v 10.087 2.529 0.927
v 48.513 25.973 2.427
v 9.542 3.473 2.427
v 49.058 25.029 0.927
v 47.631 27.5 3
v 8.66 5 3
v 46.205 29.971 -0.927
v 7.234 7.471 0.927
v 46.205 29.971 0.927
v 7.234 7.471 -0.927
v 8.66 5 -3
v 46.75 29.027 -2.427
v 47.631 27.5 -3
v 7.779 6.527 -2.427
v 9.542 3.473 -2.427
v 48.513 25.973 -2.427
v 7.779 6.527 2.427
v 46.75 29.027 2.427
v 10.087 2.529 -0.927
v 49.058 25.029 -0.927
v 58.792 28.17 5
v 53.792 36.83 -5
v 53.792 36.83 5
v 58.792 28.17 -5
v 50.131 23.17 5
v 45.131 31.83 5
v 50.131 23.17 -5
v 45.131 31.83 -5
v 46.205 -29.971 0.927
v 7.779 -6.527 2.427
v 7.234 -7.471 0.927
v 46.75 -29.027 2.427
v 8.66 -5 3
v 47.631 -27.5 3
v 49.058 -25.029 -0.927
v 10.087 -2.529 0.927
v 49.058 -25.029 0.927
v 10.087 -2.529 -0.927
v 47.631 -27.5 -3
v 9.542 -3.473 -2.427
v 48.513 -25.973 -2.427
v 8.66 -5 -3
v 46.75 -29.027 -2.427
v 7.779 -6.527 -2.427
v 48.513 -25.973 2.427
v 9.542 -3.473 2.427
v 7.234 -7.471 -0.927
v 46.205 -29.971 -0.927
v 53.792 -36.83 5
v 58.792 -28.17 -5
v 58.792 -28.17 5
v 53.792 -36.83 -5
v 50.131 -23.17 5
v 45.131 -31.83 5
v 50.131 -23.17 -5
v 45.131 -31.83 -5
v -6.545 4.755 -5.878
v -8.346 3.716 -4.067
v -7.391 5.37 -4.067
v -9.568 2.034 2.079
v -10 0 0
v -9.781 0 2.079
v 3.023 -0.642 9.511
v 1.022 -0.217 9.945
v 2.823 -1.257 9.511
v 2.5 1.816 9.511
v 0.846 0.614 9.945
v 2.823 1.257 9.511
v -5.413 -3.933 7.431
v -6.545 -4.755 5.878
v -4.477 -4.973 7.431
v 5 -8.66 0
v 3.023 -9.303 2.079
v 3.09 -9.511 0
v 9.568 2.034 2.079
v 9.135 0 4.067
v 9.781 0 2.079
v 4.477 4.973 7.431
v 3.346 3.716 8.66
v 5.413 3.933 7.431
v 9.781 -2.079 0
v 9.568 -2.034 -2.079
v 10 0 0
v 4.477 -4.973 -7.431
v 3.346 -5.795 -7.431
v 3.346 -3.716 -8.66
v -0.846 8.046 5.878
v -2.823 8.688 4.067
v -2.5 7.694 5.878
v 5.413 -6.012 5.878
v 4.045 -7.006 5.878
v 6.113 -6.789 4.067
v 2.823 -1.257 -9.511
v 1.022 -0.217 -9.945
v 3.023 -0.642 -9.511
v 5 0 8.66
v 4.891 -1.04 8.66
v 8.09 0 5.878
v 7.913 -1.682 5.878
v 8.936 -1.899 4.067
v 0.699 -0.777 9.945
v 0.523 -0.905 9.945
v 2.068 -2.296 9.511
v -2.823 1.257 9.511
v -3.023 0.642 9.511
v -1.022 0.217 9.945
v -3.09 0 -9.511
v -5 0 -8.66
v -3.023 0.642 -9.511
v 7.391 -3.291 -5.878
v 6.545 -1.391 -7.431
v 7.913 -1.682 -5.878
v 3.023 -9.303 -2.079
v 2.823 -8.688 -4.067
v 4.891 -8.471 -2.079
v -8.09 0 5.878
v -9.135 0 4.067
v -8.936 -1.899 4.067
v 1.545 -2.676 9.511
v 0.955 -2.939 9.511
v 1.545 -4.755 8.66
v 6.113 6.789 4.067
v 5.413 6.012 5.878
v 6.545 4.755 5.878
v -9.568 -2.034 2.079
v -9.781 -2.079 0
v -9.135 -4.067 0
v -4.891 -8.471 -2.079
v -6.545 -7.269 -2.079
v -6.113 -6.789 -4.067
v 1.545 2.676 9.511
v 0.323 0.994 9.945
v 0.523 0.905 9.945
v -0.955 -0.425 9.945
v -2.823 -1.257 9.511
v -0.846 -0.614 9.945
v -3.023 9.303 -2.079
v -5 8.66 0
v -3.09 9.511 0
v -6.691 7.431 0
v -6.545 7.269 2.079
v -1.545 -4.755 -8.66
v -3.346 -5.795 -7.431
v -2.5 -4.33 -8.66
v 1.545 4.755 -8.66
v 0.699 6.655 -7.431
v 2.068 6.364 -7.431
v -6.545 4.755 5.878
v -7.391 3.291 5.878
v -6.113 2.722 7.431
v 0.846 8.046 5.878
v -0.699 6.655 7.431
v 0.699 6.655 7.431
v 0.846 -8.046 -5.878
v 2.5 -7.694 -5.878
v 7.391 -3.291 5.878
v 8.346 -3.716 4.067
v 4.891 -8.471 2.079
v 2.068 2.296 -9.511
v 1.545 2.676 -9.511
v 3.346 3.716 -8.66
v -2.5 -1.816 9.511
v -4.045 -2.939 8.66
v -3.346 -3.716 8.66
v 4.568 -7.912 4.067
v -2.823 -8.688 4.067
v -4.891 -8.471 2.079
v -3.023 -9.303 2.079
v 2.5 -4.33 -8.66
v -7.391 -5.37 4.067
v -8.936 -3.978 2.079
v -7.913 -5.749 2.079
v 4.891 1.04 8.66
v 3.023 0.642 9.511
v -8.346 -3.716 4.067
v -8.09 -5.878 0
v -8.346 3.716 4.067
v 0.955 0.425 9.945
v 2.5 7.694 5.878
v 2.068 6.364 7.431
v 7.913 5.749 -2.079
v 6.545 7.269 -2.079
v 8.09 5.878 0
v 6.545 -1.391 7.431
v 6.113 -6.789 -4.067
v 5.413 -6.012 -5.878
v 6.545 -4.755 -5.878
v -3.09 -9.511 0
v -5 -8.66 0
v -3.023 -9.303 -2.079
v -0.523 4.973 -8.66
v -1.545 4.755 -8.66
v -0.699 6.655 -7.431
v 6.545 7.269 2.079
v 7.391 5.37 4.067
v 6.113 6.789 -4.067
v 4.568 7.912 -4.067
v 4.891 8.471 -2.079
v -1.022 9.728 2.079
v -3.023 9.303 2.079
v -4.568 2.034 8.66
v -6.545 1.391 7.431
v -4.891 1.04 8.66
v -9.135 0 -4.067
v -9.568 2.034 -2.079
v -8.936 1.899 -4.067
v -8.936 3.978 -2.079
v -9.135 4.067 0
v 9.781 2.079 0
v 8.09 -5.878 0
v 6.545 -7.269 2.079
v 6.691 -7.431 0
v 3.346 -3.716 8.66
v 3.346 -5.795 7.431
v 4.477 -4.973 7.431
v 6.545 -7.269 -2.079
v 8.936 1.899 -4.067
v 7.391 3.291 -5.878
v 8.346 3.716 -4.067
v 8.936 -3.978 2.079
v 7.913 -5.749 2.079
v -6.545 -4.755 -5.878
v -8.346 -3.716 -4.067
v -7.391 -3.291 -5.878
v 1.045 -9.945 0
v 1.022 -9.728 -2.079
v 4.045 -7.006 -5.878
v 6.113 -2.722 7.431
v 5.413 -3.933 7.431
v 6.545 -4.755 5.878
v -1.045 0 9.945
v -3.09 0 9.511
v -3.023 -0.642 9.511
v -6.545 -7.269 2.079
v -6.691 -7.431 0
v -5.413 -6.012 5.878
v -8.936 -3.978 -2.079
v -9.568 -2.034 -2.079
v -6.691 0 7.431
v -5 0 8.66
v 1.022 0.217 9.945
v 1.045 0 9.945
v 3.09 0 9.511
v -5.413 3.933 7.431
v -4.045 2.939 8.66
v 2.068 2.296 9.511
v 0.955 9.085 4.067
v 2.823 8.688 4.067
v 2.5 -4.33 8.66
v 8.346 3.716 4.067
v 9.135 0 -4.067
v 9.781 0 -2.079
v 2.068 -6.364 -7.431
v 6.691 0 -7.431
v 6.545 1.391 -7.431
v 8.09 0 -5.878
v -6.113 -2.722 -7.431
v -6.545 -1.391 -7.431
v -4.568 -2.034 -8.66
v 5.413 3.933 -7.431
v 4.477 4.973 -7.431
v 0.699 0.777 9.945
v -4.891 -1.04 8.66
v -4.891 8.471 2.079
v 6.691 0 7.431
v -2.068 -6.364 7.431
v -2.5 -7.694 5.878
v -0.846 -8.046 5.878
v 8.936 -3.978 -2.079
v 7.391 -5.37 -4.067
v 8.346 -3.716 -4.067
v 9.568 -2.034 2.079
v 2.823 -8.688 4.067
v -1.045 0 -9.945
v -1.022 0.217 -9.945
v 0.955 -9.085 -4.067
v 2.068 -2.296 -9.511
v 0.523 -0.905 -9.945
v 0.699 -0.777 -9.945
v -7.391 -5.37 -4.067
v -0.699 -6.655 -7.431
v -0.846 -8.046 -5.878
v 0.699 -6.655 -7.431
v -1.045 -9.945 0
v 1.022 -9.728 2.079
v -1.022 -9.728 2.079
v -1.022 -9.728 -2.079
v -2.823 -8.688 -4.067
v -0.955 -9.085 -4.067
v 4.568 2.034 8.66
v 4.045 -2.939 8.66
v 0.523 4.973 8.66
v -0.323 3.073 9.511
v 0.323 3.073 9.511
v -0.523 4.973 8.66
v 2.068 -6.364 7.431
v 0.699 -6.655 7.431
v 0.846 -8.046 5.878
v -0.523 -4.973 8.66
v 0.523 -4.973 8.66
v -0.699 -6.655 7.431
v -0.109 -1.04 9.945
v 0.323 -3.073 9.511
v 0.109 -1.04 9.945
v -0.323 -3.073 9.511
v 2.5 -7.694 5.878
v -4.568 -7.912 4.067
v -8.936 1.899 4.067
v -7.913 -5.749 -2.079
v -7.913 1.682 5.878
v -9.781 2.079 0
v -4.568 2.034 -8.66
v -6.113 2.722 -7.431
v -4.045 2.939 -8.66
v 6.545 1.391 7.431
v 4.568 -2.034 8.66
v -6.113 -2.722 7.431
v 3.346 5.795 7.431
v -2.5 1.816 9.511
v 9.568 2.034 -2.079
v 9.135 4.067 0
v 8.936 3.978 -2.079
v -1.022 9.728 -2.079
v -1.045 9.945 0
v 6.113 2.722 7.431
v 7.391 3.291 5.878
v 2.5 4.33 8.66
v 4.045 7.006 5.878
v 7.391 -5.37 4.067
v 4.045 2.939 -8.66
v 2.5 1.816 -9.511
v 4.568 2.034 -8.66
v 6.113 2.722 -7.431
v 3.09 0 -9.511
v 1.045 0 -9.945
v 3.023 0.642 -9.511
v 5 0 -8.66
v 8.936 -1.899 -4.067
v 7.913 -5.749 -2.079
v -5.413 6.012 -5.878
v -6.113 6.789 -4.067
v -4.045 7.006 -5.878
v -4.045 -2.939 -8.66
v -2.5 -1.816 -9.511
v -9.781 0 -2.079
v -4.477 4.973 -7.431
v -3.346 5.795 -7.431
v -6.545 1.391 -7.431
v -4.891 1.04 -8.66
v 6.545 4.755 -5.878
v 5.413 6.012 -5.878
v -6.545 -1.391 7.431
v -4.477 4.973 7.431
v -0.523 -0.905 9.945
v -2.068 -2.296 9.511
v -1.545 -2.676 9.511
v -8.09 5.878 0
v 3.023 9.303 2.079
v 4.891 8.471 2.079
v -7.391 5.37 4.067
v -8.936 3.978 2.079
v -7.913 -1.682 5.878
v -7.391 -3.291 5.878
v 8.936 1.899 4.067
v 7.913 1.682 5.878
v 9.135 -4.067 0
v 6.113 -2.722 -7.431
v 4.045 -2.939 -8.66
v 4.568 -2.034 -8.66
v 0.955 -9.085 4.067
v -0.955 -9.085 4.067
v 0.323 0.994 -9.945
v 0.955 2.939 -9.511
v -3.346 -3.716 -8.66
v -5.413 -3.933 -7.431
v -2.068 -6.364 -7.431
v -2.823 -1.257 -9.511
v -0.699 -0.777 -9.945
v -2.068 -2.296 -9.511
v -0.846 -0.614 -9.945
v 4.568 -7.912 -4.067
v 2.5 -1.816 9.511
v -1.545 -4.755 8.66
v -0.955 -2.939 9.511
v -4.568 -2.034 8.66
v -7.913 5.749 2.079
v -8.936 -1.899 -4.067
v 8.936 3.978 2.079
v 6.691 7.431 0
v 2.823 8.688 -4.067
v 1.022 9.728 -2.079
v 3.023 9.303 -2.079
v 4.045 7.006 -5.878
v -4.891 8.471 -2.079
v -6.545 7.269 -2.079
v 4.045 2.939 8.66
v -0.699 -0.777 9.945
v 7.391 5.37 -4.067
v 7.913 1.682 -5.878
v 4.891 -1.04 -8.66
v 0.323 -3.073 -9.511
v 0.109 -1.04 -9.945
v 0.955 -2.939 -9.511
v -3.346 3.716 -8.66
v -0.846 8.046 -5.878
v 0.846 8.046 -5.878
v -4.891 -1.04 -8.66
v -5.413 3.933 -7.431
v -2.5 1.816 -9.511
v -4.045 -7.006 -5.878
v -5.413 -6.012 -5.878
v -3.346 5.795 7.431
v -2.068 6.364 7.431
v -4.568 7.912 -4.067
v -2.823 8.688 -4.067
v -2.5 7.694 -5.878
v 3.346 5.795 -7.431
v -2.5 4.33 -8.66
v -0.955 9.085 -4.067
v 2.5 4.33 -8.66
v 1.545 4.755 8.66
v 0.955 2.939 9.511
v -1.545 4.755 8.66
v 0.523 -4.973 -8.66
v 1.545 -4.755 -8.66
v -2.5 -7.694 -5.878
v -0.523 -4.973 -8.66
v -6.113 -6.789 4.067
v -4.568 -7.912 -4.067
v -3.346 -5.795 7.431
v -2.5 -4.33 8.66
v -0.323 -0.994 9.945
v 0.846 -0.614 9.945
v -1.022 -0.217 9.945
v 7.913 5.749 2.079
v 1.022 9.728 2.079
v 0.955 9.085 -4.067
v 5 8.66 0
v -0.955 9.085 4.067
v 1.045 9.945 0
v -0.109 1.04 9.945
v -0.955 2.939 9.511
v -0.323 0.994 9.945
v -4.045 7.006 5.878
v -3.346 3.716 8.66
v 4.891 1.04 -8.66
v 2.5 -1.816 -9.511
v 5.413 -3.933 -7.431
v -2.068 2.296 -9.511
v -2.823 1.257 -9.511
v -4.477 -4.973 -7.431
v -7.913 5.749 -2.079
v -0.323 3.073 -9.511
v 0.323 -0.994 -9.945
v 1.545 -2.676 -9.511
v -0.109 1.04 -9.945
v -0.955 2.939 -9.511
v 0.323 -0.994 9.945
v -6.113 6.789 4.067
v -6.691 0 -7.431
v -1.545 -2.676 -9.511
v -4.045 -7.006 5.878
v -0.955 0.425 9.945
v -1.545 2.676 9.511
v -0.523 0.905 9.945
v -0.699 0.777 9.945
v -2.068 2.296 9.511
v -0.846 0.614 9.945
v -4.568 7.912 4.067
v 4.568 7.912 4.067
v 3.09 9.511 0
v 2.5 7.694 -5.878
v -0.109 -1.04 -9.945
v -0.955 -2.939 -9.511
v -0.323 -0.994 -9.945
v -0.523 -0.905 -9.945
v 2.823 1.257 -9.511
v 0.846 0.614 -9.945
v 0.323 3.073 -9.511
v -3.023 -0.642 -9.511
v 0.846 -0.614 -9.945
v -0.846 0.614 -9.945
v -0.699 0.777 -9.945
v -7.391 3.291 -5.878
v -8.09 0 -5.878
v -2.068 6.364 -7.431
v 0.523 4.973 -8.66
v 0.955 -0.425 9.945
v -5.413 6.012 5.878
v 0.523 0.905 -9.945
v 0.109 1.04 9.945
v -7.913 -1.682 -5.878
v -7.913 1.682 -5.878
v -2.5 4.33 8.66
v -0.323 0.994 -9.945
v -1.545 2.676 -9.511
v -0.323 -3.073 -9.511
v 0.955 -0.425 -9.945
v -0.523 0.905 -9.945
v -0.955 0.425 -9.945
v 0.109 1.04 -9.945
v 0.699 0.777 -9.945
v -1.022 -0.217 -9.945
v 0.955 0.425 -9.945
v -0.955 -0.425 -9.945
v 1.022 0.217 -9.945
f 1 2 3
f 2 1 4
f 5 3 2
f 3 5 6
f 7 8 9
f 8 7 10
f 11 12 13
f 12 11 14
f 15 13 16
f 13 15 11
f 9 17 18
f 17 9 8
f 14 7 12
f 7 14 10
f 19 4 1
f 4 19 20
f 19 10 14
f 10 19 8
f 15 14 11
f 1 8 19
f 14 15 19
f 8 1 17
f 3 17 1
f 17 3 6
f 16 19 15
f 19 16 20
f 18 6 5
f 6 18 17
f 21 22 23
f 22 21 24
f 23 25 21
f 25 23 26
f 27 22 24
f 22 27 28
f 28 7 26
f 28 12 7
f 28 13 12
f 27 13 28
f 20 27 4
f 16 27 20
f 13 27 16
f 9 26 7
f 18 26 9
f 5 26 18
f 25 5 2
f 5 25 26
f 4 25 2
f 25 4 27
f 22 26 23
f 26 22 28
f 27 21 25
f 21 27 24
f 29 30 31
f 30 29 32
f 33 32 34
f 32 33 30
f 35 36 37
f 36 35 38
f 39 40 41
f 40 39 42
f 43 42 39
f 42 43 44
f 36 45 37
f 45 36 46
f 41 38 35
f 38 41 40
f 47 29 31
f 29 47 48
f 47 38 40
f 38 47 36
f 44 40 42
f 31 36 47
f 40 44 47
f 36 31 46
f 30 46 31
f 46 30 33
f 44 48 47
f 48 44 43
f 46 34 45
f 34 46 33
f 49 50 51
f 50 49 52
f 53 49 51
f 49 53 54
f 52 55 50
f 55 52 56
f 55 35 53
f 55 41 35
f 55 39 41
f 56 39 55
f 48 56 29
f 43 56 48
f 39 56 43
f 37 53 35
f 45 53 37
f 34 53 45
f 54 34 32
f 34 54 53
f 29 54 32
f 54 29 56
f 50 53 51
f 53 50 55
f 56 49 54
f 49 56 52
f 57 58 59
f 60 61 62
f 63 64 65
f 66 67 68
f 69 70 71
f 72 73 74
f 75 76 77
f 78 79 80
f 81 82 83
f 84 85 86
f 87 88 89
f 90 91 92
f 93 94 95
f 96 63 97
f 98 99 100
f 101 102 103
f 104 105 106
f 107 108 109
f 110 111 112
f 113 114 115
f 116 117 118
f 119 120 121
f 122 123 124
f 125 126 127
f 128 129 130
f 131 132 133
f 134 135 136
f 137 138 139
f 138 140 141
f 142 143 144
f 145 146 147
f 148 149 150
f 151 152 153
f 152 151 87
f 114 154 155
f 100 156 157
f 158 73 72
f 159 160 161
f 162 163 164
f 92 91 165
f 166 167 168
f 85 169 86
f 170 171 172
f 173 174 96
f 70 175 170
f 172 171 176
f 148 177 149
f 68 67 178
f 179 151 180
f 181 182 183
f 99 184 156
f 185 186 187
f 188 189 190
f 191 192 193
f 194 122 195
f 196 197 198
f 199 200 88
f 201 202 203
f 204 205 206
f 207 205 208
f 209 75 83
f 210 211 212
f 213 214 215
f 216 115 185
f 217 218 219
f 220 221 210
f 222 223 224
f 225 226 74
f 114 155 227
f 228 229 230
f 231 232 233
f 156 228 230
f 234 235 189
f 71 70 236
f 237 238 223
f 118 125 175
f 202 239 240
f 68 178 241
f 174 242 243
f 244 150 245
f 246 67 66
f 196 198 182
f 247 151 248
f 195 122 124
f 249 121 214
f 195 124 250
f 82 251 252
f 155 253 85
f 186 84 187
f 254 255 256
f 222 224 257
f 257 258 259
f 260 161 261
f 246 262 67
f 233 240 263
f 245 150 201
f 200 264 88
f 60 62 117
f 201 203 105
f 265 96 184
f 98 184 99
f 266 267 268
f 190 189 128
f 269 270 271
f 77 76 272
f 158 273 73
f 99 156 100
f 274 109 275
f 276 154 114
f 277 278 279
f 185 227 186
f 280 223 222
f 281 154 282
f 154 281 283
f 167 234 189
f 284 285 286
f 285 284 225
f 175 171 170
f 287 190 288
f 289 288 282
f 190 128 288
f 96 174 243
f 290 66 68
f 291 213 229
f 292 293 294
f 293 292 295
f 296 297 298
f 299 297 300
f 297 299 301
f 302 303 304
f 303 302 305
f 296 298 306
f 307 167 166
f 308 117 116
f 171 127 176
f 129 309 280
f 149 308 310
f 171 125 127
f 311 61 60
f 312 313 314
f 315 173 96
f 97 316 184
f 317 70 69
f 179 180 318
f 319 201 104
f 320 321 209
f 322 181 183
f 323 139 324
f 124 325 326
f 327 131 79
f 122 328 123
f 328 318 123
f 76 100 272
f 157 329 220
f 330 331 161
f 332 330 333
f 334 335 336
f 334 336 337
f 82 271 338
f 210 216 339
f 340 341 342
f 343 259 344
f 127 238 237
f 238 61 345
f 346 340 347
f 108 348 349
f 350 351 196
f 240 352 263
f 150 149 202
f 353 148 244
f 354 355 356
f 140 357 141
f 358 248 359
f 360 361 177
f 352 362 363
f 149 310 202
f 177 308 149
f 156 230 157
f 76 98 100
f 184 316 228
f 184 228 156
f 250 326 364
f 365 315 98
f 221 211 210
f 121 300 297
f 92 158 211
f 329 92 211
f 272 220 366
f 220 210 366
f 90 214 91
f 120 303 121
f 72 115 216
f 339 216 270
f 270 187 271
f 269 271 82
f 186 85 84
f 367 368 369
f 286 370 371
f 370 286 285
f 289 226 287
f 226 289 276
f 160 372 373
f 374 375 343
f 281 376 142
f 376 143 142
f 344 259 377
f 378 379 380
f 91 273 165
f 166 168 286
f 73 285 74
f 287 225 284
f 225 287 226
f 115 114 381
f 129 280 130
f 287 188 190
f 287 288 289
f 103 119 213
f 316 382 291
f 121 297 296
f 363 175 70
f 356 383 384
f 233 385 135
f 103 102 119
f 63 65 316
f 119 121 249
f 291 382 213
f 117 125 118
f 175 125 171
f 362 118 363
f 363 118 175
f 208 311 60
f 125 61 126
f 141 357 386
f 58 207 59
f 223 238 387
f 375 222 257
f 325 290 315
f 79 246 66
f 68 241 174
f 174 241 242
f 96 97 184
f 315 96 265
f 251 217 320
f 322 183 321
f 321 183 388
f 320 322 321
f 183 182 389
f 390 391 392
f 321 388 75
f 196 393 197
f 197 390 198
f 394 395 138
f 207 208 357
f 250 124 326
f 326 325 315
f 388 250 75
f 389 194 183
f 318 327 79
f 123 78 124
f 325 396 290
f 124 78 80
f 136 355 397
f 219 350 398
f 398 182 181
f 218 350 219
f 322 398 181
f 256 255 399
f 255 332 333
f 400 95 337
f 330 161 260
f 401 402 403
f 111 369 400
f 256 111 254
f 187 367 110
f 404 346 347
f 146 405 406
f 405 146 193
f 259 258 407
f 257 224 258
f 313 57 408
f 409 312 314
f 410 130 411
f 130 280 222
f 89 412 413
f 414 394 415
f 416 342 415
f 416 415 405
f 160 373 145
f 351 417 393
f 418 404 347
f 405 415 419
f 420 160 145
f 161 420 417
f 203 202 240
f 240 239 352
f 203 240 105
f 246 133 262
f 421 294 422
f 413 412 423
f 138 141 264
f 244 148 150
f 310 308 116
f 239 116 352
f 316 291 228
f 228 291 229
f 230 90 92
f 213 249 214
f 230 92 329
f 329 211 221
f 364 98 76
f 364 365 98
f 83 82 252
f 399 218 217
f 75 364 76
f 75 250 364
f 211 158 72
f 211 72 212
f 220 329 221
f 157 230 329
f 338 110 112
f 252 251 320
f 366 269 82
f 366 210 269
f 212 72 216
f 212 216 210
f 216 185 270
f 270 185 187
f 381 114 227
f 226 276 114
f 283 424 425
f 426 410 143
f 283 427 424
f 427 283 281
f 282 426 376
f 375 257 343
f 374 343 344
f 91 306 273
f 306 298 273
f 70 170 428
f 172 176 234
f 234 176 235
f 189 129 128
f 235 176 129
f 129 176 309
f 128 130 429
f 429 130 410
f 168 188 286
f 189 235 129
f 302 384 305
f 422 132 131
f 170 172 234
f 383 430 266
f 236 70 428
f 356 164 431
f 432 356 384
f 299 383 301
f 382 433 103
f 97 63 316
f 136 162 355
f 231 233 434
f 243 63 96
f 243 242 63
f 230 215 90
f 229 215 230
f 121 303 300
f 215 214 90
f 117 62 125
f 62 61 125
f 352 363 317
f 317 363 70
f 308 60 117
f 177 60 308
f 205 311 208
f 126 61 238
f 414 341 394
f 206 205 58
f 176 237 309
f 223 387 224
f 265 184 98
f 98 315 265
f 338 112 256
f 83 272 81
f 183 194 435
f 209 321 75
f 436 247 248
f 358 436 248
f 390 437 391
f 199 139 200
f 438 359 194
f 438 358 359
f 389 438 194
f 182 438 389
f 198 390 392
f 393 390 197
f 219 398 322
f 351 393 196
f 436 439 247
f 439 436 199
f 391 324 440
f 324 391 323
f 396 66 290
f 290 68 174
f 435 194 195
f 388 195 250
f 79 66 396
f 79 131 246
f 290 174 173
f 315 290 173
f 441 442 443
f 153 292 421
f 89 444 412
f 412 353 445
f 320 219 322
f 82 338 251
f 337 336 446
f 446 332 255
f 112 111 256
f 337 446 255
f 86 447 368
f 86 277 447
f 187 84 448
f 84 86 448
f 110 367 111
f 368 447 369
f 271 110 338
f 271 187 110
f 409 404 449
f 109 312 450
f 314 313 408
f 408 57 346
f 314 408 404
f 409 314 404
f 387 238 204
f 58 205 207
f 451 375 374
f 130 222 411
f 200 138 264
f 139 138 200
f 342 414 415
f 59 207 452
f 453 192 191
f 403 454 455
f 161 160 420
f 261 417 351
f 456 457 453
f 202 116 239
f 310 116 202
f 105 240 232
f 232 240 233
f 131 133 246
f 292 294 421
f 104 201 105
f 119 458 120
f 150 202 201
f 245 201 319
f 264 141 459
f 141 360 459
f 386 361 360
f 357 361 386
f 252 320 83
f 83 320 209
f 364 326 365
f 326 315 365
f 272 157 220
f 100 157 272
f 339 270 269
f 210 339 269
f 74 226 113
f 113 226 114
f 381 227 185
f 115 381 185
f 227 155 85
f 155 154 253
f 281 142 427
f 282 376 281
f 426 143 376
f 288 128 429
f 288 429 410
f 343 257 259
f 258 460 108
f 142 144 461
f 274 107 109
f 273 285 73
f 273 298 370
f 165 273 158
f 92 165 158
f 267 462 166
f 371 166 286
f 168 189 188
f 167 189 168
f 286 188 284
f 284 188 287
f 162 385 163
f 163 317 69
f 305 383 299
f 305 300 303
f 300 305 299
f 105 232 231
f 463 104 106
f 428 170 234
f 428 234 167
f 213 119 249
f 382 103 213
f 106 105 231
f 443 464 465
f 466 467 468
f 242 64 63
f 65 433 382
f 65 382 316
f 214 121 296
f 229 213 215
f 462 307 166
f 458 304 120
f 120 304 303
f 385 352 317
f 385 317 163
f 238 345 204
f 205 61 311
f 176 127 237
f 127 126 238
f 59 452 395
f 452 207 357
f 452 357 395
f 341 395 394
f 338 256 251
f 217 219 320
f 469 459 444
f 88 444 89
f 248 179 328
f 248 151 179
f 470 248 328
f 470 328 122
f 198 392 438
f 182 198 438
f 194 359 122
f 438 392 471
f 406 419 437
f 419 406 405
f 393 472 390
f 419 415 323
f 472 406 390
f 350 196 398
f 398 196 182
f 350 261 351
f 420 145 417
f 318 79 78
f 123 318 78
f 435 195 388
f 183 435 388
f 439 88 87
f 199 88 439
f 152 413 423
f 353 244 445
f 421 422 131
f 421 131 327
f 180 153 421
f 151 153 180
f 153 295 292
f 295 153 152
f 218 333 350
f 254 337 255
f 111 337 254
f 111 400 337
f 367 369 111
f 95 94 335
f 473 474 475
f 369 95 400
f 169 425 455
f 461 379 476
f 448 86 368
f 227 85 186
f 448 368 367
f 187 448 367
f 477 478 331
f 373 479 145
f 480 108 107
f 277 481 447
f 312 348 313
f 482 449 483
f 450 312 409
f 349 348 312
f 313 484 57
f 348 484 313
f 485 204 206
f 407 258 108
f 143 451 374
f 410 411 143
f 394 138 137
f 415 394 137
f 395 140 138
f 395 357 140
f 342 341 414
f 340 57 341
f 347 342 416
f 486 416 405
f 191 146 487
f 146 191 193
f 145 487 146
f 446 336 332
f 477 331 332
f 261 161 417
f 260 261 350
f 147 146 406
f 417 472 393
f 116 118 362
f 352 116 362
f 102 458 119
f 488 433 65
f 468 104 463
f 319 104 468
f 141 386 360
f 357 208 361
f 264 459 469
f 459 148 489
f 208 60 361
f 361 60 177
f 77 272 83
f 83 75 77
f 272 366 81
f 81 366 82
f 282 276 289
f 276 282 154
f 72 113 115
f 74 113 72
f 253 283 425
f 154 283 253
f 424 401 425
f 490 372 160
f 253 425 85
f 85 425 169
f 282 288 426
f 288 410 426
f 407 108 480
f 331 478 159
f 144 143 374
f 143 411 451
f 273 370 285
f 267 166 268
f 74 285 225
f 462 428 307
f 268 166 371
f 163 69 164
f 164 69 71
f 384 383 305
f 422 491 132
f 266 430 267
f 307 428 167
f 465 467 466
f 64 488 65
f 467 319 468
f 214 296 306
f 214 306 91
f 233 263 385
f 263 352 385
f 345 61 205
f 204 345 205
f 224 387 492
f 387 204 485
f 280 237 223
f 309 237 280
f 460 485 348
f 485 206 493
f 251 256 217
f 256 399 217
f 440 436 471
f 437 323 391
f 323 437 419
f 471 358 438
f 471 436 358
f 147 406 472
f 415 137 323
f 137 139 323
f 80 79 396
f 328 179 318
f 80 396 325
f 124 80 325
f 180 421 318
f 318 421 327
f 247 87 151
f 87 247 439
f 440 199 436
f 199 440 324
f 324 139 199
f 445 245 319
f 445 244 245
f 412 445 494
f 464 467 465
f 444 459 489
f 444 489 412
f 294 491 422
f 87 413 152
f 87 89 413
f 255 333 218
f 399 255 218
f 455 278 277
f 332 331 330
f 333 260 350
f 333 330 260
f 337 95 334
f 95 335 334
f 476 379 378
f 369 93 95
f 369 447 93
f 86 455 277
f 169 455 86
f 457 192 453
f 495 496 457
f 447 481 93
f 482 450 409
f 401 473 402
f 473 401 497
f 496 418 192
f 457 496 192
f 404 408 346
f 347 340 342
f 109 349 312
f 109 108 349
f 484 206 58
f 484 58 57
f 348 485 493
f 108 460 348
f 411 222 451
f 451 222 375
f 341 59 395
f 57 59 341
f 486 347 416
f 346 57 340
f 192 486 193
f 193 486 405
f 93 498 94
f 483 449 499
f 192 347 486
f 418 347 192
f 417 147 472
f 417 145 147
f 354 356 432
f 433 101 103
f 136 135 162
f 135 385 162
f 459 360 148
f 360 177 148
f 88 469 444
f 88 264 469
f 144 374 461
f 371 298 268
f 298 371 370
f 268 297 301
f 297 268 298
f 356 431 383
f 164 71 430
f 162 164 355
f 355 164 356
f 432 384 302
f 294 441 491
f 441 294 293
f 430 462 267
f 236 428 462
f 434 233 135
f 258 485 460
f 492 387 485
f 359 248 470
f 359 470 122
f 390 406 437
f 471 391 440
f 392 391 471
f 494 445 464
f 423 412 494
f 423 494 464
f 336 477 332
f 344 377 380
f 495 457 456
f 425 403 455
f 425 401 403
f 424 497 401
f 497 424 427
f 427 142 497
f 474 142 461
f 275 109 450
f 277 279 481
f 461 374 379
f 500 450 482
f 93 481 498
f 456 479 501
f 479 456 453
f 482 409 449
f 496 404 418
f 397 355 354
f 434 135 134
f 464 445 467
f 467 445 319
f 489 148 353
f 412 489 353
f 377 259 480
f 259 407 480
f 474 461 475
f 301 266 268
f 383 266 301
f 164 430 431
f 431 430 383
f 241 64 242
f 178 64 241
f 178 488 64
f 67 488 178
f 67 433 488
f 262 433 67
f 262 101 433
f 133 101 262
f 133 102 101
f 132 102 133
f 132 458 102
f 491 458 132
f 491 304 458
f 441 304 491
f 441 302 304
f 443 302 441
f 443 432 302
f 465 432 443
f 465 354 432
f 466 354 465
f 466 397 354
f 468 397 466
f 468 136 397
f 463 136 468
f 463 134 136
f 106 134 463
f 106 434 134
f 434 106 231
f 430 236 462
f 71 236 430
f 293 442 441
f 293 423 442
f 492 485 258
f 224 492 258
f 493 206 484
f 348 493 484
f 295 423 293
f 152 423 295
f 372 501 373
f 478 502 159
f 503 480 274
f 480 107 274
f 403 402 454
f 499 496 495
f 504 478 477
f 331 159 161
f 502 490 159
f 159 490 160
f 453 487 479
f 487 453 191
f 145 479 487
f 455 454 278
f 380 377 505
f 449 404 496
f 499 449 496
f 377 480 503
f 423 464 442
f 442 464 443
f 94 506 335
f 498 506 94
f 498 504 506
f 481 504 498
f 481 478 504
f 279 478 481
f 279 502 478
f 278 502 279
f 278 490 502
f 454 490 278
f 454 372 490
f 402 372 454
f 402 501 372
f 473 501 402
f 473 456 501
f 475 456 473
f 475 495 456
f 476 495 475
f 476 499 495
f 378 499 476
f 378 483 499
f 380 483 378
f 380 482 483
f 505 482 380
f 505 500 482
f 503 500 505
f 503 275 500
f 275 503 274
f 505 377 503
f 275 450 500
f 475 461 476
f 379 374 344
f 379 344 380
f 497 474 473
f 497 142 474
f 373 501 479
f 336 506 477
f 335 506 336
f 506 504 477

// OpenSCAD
//Sender
sphere(10);

rotate([0,0,30])
WR();

rotate([0,0,-30])
WR();

module WR()
{
//Wire
translate([10,0,0])
rotate([0,90,0])
cylinder(h = 50, r = 3);

//Receiver
translate([60,0,0])
cube(10, center = true);
}
